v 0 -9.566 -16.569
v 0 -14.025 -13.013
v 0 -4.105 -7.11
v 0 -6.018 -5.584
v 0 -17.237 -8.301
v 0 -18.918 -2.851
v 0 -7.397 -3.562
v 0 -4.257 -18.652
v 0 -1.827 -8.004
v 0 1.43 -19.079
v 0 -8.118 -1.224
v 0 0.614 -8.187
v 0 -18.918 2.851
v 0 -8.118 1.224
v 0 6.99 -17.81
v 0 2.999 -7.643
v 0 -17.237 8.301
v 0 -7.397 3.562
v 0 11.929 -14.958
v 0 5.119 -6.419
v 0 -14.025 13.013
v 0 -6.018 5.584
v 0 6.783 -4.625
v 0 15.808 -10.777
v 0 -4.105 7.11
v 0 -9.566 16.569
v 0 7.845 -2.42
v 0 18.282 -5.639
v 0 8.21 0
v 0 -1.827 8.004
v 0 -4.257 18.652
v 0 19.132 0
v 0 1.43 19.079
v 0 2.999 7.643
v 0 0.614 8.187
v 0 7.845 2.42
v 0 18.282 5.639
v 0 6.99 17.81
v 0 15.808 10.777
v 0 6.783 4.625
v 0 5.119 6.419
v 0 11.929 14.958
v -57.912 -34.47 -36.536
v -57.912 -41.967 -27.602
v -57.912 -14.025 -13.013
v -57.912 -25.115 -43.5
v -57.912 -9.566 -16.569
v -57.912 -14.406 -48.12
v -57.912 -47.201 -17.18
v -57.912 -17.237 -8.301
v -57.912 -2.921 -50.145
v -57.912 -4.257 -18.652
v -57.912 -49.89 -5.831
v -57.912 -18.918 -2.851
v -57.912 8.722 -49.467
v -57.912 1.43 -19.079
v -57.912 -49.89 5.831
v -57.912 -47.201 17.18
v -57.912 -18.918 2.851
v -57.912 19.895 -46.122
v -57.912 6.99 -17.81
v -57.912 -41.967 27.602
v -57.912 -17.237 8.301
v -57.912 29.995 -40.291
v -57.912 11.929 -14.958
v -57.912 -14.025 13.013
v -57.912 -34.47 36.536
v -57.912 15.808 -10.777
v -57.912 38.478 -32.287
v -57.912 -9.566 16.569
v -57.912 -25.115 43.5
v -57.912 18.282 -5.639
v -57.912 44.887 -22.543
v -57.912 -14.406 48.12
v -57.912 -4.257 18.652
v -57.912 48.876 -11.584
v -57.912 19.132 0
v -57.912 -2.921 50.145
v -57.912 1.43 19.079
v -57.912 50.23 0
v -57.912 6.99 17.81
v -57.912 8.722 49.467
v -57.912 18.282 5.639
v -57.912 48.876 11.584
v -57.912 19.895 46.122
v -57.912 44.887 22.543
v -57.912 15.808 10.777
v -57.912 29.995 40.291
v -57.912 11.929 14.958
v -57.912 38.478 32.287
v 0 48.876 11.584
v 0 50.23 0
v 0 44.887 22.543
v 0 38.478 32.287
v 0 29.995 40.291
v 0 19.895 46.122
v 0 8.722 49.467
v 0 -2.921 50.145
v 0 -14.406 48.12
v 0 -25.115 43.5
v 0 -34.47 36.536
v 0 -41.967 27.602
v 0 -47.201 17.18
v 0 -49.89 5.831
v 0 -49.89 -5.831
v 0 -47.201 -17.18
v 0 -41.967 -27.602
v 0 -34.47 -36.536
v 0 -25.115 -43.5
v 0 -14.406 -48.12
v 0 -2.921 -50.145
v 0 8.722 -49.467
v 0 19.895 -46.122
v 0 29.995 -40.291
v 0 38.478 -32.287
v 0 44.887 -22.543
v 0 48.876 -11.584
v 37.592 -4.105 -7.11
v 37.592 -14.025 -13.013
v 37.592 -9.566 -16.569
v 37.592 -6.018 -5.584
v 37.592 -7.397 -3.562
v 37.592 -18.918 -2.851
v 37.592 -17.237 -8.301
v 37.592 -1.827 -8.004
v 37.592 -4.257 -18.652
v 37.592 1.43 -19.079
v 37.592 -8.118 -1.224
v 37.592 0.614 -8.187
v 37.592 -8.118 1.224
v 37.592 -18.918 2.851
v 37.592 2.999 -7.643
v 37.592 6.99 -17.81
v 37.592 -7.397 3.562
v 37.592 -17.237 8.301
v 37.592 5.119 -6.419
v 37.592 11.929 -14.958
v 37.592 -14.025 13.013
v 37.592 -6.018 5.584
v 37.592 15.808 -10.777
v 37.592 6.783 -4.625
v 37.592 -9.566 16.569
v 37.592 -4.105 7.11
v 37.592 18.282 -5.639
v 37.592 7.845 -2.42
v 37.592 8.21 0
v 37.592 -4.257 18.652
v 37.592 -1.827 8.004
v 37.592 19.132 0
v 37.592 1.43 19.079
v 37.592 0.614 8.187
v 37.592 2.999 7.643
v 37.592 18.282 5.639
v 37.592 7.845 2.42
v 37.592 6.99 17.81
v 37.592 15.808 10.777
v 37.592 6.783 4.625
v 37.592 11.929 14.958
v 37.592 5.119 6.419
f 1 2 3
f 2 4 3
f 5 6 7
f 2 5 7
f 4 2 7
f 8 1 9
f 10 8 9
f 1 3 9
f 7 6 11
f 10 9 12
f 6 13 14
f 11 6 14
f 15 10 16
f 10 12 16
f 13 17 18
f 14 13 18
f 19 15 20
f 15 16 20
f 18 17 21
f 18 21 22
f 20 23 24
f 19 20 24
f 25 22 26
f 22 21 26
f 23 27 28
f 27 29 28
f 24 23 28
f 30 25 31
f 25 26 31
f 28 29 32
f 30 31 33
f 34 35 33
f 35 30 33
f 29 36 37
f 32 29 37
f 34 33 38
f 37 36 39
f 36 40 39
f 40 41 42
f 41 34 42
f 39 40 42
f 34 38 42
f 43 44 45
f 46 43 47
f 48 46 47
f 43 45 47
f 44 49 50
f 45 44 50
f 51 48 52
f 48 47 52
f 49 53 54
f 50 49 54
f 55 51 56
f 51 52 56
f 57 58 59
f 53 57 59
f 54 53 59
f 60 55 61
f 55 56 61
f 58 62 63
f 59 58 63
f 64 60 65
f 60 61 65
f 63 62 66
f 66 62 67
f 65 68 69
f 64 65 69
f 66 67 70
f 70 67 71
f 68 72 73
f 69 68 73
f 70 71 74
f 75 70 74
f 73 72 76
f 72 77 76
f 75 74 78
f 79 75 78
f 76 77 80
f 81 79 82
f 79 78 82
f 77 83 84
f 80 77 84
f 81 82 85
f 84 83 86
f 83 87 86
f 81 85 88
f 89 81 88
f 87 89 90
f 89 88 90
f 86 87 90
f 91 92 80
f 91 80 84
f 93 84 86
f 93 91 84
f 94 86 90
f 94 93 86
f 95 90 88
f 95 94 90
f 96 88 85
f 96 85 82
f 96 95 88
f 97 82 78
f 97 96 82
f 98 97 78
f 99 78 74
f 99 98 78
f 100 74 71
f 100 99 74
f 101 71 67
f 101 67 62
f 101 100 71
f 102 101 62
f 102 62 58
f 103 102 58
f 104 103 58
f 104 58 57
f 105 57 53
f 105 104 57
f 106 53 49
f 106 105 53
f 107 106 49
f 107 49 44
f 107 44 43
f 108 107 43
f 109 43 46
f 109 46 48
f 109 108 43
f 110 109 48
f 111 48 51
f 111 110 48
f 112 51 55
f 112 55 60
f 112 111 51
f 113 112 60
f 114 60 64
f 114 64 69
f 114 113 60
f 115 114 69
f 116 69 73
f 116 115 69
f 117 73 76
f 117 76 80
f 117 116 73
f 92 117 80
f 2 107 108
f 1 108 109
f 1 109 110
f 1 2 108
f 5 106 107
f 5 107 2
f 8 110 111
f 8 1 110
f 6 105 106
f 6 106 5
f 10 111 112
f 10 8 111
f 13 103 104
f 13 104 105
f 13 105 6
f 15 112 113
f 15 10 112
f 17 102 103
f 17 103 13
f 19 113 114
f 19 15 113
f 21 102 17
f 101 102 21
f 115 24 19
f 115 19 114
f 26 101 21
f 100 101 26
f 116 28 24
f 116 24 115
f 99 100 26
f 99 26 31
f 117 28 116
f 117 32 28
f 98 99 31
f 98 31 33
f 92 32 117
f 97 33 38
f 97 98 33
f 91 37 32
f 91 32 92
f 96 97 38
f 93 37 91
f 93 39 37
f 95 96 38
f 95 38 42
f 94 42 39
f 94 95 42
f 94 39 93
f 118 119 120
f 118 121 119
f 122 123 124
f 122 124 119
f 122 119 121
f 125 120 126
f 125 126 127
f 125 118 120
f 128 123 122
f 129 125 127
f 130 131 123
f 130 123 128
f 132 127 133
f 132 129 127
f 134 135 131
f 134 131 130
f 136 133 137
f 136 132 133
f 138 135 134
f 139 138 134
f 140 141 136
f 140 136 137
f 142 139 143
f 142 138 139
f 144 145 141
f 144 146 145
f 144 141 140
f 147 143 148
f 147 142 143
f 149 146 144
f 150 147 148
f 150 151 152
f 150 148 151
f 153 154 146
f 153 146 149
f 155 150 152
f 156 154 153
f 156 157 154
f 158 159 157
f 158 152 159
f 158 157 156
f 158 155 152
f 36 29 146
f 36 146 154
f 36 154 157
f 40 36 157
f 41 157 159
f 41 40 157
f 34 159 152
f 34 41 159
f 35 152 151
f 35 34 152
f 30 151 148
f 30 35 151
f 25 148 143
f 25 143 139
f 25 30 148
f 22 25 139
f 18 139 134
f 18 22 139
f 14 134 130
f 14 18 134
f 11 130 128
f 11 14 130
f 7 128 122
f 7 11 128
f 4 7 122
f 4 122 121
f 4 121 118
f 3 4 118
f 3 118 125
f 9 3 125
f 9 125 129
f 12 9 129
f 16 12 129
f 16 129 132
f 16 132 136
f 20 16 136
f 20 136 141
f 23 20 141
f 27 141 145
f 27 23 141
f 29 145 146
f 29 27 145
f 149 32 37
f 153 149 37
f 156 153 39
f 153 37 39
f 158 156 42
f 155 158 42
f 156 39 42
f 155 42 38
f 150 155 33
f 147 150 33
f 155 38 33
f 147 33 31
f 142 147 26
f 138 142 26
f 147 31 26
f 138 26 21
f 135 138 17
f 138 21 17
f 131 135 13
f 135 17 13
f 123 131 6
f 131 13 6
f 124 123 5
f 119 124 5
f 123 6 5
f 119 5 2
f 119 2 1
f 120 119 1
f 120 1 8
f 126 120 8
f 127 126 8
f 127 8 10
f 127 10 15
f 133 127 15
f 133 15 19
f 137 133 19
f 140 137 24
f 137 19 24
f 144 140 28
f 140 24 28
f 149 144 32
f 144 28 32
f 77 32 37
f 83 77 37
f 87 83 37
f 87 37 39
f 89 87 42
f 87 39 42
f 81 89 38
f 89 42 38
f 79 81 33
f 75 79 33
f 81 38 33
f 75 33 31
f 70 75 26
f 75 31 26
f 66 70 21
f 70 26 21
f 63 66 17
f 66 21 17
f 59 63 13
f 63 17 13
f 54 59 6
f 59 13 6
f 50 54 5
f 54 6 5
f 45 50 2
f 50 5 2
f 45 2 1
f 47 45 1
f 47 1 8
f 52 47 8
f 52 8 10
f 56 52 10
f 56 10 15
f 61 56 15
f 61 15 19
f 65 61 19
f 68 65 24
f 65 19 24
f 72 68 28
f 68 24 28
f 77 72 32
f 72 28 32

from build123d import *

# Parameters (mm, degrees)
F0_R     = 19.1321000997
F0_R_2   = 8.2100576967
F1_DEPTH = 37.592
F0_R_3   = 50.230050037
F0_R_4   = 27.2680196018
F2_DEPTH = 57.912
F3_DEPTH = 57.913


with BuildPart() as f1:
    # F0 (on Right) → F1 (new body)
    with BuildSketch(Plane.YZ):
        Circle(F0_R)
        Circle(F0_R_2, mode=Mode.SUBTRACT)
    extrude(amount=F1_DEPTH)

    # F0 (on Right) → F3 (cut, through all)
    with BuildSketch(Plane.YZ):
        Circle(F0_R_2)
    extrude(amount=-F3_DEPTH, mode=Mode.SUBTRACT)


with BuildPart() as f2:
    # F0 (on Right) → F2 (new body)
    with BuildSketch(Plane.YZ):
        Circle(F0_R_3)
        Circle(F0_R_4, mode=Mode.SUBTRACT)
        Circle(F0_R_4)
        Circle(F0_R, mode=Mode.SUBTRACT)
    extrude(amount=-F2_DEPTH)


solid = Compound([f1.part, f2.part])
